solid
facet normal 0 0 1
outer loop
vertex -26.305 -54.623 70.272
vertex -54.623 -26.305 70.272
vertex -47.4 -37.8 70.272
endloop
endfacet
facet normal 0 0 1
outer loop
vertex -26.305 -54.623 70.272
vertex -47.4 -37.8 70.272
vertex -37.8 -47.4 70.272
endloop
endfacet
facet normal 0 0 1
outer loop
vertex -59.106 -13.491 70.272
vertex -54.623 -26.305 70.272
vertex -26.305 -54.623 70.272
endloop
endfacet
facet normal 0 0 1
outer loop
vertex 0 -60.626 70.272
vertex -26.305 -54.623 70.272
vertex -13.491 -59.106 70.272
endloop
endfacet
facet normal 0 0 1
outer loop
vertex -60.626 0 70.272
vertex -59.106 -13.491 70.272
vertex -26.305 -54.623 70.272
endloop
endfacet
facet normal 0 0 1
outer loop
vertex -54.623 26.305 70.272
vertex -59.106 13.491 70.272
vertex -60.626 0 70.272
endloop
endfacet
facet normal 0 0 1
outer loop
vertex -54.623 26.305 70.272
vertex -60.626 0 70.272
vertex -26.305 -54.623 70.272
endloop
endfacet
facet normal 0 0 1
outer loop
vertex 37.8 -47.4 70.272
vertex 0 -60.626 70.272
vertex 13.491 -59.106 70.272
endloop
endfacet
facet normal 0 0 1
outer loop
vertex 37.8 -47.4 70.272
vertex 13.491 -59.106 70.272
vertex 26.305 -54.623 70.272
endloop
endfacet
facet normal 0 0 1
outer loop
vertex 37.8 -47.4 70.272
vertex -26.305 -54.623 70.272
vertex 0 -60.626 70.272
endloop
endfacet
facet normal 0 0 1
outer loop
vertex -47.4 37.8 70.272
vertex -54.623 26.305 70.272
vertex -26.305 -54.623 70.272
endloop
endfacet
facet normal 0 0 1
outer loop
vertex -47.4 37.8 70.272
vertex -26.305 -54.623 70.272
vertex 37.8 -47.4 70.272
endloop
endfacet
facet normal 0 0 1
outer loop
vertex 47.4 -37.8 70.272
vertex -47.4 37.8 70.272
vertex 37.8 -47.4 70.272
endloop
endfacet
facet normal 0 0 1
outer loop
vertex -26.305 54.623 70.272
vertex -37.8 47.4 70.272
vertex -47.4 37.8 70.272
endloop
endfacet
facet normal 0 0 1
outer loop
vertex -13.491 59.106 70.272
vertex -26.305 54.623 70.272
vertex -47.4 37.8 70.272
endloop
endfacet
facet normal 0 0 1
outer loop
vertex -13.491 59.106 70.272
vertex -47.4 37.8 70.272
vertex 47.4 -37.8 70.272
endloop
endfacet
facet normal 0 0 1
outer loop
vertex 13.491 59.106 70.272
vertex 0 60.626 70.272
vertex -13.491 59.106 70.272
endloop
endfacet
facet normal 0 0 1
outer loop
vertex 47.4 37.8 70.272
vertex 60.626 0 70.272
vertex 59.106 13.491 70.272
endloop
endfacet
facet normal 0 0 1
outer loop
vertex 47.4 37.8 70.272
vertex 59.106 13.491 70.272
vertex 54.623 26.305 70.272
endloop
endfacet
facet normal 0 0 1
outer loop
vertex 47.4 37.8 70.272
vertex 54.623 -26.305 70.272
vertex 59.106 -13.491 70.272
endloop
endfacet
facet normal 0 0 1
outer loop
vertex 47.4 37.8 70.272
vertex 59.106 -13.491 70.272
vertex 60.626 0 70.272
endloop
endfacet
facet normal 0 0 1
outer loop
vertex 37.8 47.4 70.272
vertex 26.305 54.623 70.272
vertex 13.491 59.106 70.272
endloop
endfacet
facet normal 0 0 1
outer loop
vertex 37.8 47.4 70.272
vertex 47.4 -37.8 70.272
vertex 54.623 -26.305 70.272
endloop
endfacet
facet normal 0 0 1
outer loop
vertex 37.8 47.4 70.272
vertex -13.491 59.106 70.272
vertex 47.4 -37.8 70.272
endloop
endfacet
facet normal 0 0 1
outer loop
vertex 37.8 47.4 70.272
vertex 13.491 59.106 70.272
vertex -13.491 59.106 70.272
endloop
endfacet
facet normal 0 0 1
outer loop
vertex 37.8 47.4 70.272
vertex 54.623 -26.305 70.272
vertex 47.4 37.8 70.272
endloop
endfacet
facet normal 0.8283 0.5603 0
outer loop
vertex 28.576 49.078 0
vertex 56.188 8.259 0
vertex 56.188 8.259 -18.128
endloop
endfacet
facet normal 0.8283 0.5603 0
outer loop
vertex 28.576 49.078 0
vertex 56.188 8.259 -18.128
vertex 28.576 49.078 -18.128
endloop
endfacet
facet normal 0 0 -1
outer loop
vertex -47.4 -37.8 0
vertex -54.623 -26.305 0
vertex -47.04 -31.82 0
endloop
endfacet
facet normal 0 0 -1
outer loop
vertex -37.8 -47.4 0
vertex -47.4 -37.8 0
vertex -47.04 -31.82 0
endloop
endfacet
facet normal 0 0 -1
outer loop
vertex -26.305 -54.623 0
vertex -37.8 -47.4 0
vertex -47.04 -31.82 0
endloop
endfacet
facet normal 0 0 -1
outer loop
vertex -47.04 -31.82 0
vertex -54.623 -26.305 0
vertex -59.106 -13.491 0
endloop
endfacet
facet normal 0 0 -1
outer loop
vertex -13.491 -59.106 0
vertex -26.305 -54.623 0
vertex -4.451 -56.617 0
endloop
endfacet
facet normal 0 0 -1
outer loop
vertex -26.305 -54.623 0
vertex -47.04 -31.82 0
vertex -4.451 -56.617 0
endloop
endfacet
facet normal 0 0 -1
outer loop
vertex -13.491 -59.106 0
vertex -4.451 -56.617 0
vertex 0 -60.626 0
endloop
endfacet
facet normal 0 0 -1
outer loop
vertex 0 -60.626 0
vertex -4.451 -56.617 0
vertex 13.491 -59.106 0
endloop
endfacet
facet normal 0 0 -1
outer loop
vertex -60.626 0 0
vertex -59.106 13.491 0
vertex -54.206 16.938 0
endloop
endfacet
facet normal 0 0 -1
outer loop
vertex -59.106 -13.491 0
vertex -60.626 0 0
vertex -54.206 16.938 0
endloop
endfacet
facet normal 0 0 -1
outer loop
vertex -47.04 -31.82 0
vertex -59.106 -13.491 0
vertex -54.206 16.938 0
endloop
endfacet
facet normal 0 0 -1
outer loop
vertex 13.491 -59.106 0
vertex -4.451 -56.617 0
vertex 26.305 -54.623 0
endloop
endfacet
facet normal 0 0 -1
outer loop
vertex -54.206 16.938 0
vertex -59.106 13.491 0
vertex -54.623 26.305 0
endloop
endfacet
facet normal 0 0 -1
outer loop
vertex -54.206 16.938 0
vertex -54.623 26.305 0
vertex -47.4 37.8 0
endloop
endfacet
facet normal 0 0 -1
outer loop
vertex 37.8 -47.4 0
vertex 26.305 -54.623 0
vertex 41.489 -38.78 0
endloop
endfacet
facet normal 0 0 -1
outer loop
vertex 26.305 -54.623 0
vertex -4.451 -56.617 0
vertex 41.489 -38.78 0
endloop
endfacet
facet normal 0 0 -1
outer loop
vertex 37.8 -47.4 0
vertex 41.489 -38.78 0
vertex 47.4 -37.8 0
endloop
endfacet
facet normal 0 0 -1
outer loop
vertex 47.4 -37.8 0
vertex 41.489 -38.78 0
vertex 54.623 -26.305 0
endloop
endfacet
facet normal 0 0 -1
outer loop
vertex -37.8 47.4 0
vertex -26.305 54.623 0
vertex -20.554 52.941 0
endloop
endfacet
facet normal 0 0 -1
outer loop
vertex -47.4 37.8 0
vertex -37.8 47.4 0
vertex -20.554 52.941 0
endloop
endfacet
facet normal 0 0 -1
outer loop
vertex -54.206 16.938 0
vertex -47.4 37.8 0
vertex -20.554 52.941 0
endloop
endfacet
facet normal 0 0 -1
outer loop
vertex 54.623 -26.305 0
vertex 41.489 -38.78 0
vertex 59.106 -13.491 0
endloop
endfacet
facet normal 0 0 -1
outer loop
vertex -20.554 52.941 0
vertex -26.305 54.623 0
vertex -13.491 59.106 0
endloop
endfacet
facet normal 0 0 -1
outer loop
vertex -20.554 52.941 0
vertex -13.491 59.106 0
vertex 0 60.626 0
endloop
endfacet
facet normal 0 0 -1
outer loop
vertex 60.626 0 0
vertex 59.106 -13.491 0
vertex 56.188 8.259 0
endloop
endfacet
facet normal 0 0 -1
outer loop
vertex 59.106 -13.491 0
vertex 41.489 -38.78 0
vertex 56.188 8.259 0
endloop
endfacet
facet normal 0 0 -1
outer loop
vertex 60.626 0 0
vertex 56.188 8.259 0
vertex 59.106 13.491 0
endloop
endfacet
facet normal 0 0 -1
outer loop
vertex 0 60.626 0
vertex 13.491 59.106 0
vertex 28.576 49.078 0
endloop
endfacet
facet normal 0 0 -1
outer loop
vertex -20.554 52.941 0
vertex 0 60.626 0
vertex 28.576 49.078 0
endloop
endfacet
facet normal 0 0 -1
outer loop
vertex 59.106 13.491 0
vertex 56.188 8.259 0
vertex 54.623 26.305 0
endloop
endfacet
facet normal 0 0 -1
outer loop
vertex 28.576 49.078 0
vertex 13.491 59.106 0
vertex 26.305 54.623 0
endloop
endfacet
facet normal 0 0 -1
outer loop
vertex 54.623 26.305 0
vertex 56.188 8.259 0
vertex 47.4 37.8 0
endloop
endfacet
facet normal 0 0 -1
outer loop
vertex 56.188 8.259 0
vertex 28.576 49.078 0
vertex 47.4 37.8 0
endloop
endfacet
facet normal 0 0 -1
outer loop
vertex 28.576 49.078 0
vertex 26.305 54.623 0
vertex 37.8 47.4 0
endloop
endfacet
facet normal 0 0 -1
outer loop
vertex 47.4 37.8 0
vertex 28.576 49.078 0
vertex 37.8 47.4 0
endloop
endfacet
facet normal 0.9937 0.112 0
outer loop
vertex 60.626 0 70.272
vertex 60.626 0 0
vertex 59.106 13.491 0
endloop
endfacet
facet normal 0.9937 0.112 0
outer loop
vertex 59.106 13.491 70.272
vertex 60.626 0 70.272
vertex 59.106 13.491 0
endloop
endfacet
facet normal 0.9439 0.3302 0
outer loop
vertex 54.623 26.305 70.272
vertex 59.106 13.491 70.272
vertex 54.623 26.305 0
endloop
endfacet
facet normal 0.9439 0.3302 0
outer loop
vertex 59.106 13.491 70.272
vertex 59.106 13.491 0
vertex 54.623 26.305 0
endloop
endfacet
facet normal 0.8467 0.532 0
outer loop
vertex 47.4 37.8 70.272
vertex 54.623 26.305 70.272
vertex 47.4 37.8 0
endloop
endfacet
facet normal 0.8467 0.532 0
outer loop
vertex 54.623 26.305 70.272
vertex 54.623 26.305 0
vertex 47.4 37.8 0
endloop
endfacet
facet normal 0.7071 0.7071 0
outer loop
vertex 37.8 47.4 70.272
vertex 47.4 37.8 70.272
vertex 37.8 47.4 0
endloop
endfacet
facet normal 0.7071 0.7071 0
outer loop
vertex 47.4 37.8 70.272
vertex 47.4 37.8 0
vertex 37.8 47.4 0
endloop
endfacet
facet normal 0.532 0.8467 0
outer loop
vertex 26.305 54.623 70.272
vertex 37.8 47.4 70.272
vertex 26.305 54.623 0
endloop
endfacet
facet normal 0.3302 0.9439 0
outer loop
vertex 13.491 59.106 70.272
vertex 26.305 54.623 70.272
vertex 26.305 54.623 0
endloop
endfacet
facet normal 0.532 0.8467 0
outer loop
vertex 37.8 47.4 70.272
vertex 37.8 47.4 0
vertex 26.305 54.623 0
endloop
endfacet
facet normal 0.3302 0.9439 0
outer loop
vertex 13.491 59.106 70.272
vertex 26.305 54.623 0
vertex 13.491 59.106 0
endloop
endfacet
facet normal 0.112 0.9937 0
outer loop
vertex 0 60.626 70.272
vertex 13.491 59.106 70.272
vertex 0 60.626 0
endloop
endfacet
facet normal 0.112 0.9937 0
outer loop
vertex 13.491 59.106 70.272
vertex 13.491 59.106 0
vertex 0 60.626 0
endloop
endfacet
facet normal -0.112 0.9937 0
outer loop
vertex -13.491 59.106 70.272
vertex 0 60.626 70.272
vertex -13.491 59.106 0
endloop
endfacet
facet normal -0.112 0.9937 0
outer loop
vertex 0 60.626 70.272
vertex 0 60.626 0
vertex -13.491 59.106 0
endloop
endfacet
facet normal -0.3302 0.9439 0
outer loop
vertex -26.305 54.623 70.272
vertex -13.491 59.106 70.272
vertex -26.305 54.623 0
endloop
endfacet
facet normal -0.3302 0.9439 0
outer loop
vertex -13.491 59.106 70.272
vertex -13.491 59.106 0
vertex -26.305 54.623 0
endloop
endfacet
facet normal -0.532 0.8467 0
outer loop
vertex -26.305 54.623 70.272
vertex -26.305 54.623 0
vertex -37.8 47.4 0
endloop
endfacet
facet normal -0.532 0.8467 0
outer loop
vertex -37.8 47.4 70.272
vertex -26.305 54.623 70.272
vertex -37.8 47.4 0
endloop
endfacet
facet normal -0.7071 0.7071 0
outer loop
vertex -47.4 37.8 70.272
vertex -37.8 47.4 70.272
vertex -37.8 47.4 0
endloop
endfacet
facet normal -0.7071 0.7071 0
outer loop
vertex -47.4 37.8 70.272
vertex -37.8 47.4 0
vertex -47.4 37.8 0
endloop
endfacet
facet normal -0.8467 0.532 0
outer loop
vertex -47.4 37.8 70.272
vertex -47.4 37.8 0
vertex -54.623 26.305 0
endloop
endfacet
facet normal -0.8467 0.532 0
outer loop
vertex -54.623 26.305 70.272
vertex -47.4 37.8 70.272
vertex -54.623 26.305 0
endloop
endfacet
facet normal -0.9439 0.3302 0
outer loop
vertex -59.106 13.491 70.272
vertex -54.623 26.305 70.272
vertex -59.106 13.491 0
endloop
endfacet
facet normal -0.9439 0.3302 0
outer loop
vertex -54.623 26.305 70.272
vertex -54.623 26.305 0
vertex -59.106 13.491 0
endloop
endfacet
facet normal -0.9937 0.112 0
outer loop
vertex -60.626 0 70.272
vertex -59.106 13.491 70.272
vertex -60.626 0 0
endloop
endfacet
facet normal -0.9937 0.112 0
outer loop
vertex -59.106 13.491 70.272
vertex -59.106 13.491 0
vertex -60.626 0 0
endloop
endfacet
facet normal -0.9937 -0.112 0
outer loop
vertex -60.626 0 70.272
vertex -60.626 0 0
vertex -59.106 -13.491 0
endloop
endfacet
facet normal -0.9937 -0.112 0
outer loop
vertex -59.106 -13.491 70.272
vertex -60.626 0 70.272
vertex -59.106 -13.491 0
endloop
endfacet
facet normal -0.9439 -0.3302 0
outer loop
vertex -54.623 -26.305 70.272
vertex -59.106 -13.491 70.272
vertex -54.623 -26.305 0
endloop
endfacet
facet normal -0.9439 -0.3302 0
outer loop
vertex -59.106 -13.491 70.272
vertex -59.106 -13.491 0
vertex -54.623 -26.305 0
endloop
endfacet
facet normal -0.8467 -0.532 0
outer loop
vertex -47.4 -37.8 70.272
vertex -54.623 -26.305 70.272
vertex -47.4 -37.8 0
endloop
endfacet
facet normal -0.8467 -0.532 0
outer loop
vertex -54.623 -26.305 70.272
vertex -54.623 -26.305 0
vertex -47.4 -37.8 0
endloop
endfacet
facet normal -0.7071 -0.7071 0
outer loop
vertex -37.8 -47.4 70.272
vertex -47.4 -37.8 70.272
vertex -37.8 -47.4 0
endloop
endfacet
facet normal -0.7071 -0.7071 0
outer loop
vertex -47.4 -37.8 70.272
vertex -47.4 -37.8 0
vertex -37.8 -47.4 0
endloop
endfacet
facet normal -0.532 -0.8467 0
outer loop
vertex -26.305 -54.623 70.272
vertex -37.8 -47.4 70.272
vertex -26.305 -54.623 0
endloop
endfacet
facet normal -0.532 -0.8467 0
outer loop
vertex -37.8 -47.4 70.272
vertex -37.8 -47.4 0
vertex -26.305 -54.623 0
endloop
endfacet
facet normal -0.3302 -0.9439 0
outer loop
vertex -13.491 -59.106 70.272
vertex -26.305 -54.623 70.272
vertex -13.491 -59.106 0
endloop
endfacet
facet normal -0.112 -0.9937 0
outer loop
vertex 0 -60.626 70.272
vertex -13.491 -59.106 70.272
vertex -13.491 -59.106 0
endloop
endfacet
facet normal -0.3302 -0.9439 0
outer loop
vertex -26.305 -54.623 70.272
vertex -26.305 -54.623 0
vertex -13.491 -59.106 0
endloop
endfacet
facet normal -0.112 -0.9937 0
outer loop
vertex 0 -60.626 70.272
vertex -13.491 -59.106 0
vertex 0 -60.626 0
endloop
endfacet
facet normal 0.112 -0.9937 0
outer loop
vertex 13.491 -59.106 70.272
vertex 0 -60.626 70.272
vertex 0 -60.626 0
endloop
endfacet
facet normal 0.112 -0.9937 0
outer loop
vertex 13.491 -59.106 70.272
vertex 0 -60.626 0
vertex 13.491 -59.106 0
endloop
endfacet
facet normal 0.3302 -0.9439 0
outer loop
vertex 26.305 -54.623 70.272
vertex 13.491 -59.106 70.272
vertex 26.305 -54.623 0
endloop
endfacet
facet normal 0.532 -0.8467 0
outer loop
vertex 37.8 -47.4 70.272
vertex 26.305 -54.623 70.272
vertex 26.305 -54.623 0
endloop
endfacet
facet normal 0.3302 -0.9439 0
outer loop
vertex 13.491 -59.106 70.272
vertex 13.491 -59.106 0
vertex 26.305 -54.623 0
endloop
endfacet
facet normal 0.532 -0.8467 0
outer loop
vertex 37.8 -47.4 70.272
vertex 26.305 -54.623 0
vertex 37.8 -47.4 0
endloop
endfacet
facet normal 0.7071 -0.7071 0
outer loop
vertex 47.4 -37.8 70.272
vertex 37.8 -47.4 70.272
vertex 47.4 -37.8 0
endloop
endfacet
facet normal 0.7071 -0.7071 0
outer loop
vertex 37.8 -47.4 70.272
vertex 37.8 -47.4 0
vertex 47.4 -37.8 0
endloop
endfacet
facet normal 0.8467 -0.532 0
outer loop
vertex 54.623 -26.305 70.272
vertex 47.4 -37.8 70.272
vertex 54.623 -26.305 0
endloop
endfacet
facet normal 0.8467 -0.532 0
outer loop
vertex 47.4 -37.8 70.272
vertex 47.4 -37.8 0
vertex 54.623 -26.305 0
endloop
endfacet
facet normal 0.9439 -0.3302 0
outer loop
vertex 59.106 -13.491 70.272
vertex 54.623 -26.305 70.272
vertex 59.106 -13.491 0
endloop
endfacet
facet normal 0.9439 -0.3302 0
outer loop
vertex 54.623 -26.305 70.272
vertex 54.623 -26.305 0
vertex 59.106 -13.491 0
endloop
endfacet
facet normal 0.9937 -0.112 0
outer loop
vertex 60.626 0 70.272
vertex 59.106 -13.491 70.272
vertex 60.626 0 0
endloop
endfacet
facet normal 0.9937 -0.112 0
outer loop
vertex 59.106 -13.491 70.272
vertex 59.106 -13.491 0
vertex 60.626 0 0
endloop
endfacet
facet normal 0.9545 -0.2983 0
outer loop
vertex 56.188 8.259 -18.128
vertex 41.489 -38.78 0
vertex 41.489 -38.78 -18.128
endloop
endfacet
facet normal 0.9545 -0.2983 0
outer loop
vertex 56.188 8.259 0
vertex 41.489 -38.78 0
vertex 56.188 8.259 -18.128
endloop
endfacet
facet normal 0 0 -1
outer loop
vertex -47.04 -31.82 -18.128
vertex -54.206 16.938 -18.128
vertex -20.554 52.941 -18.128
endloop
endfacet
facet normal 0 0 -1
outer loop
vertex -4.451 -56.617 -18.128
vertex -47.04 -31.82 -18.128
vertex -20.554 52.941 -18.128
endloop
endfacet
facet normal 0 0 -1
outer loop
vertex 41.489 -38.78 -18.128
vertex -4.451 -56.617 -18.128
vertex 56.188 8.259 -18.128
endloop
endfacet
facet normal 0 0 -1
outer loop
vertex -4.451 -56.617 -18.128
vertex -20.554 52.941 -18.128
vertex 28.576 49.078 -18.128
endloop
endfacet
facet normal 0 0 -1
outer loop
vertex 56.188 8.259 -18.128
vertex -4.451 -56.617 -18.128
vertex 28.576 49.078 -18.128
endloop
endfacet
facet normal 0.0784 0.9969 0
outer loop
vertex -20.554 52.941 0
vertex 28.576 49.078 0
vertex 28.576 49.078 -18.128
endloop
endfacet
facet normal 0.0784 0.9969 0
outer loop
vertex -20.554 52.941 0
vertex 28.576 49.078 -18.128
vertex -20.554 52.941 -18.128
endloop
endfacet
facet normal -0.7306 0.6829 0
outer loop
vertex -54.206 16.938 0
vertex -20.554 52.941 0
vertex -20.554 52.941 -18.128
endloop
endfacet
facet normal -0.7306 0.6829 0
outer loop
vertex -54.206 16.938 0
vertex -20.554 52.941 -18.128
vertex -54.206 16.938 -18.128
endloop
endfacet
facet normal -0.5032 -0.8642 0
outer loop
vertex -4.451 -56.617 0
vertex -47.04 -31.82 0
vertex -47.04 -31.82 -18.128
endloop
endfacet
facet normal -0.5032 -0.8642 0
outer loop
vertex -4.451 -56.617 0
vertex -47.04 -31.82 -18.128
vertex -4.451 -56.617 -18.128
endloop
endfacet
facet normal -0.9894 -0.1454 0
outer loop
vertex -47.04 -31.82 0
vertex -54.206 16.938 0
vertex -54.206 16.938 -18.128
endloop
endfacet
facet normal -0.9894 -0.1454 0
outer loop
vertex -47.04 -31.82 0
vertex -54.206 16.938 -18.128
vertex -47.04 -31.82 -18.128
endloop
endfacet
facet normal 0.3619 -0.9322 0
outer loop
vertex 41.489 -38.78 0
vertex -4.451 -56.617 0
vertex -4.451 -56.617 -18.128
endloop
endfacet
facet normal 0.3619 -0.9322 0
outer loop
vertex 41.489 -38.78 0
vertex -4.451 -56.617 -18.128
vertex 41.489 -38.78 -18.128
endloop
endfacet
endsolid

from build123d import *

# Parameters (mm, degrees)
F0_R     = 60.626412
F2_DEPTH = 70.271613
F3_DEPTH = 18.127655


with BuildPart() as f2:
    # F0 (on Top) → F2 (new body)
    with BuildSketch(Plane.XY):
        Circle(F0_R)
    extrude(amount=F2_DEPTH)

    # F1 (on face) → F3 (join)
    with BuildSketch(Plane.XY):
        Polygon((-20.55445, 52.941081), (-54.206494, 16.938108), (-47.039942, -31.819606), (-4.451355, -56.616507), (41.489194, -38.780024), (56.187533, 8.258608), (28.575514, 49.07834), align=None)
    extrude(amount=-F3_DEPTH)


solid = f2.part
